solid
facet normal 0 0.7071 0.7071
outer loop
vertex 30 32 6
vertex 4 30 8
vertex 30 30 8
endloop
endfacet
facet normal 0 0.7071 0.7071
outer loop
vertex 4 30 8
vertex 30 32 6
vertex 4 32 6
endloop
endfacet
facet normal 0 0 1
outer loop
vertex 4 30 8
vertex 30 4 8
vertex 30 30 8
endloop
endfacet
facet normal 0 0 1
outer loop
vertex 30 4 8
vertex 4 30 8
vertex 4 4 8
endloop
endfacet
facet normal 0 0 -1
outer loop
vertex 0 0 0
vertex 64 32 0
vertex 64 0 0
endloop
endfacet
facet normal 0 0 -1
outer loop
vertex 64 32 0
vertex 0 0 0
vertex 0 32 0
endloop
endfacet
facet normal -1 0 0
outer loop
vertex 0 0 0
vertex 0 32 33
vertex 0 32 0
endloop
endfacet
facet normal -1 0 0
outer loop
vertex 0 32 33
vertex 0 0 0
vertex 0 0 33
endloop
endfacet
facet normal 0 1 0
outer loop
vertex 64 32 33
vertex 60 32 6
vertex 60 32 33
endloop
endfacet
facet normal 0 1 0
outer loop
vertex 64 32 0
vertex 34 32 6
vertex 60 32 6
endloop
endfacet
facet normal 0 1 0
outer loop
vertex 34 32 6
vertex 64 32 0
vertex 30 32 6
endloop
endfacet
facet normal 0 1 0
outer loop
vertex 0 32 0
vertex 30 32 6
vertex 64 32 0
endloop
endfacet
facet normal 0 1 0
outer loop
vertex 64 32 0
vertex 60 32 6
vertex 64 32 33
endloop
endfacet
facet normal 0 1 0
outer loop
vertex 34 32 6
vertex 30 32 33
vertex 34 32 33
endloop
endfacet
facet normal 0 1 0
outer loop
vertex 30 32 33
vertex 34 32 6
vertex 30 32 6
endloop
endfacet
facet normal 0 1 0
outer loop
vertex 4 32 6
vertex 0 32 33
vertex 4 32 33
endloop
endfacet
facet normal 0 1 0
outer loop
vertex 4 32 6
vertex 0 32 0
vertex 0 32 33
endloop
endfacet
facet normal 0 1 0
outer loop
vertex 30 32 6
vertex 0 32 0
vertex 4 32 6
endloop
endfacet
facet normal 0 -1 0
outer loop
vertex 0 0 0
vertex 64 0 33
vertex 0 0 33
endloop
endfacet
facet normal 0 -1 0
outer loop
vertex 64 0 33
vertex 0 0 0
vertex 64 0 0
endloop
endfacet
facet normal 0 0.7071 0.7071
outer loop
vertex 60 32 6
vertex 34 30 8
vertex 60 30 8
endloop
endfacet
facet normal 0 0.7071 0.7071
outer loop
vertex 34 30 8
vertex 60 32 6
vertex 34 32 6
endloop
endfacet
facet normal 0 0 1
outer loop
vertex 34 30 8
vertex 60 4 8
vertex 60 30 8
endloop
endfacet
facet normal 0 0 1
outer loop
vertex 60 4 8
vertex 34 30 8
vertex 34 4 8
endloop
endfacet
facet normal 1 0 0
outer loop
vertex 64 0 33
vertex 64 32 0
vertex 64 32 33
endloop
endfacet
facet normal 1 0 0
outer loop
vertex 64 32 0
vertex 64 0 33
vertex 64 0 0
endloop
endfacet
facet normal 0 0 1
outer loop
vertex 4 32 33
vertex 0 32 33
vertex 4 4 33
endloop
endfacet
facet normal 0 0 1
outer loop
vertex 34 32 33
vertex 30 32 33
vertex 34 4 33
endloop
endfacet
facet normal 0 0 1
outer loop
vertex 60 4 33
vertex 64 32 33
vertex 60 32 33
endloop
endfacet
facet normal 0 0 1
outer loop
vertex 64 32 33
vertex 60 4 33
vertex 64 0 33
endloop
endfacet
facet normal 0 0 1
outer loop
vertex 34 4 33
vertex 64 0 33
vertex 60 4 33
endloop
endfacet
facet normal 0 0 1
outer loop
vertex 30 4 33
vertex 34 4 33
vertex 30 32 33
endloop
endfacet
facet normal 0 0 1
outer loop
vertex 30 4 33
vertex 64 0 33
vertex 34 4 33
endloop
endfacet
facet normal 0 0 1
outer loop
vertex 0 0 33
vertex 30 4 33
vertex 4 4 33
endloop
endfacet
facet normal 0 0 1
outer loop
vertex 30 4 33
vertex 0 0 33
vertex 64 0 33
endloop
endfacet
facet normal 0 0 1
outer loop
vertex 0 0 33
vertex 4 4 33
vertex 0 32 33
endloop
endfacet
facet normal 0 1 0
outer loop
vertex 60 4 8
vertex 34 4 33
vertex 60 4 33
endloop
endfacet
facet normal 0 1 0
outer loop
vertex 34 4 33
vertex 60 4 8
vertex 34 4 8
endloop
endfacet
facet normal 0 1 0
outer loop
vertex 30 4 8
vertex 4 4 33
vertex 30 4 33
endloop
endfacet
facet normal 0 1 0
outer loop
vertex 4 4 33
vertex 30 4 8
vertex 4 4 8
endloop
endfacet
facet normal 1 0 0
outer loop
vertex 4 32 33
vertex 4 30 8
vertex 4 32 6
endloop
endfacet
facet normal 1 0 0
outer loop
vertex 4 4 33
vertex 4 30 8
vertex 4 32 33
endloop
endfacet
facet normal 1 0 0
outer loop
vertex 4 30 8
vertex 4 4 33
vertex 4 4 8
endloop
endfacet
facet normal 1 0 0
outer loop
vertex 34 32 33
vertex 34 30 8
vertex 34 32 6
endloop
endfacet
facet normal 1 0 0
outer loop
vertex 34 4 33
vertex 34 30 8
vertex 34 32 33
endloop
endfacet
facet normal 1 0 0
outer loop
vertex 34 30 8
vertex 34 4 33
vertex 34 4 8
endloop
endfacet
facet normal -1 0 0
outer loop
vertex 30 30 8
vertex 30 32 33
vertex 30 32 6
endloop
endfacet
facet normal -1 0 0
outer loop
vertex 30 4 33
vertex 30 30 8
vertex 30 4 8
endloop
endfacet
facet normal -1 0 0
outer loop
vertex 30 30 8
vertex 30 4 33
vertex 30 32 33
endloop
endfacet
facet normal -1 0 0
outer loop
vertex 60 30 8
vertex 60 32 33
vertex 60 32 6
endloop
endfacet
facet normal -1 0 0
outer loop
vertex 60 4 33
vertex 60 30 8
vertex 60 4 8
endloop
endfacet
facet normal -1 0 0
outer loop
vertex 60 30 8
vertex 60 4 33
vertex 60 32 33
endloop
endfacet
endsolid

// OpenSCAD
// file: WylochStyleDungeonLibrary.scad
size = 32;
baseheight = 6;
topperheight = 2;
topperrounded = true;
walllength = size;
wallheight = 25 + baseheight + topperheight;
wallwidth = 6;
wallwidththin = 4;

function hypotenuse_ra(side_a, side_b) =
    sqrt(pow(side_a, 2) + pow(side_b, 2));
    
module wsdl_Base(s,bh)
{
    cube([s,s,bh]);
}

module wsdl_Topper(s,bh,th,tr)
{
    if (tr) {
        translate([0,0,bh])
            intersection() {
                difference () {
                        cube([s,s,th]);
                        union () {
                        rotate(a=45, v=[1,0,0])
                            cube([s,th*2,th*2]);
                        translate([0,s,0])
                            rotate(a=45, v=[1,0,0])
                                cube([s,th*2,th*2]);
                        rotate(a=-45, v=[0,1,0])
                            cube([th*2,s,th*2]);
                        translate([s,0,0])
                            rotate(a=-45, v=[0,1,0])
                                cube([th*2,s,th*2]);
                        }
                }
                translate([s/2,s/2,0])
                    cylinder(
                        h=th, 
                        r1=hypotenuse_ra(s/2-1.2, s/2-1.2), 
                        r2=hypotenuse_ra(s/2-th-.8, s/2-th-.8), 
                        center=false, 
                        $fa=.1);
            }    
    }
    else {
        translate([0,0,bh])
            difference() {
                cube([s,s,th]);
                union () {
                rotate(a=45, v=[1,0,0])
                    cube([s,th*2,th*2]);
                translate([0,s,0])
                    rotate(a=45, v=[1,0,0])
                        cube([s,th*2,th*2]);
                rotate(a=-45, v=[0,1,0])
                    cube([th*2,s,th*2]);
                translate([s,0,0])
                    rotate(a=-45, v=[0,1,0])
                        cube([th*2,s,th*2]);
                }
            }    
    }
}

module wsdl_Base_1x1(s,bh,th,tr) 
{
    union () {
        wsdl_Base(s,bh);
        wsdl_Topper(s,bh,th,tr);
    }
}

module wsdl_Base_1x2(s,bh,th,tr)
{
    union () {
        wsdl_Base_1x1(s,bh,th,tr);
        translate([s,0,0])
            wsdl_Base_1x1(s,bh,th,tr);
    }
}
 
module wsdl_Base_2x2(s,bh,th,tr)
{
    union () {
        wsdl_Base_1x2(s,bh,th,tr);
        translate([0,s,0])
            wsdl_Base_1x2(s,bh,th,tr);
    }
}
 
module wsdl_Base_2x4(s,bh,th,tr)
{
    union () {
        wsdl_Base_2x2(s,bh,th,tr);
        translate([s*2,0,0])
            wsdl_Base_2x2(s,bh,th,tr);
    }
}
 
module wsdl_Base_4x4(s,bh,th,tr)
{
    union () {
        wsdl_Base_2x4(s,bh,th,tr);
        translate([0,s*2,0])
            wsdl_Base_2x4(s,bh,th,tr);
    }
}
 
module wsdl_Wall_1(w,l,h)
{
    cube([w,l,h]);   
}

module wsdl_Wall_2(w,l,h)
{
    union() {
        wsdl_Wall_1(w,l,h);
        translate([0,l,0])
            wsdl_Wall_1(w,l,h);
    }
}

module wsdl_Wall_1_Left(w,l,h) 
{
    wsdl_Wall_1(w,l,h);
}

module wsdl_Wall_1_Right(w,l,h) 
{
    translate([(size)-w,0,0])
        wsdl_Wall_1(w,l,h);
}

module wsdl_Wall_1_DoubleRight(w,l,h) 
{
    translate([(size*2)-w,0,0])
        wsdl_Wall_1(w,l,h);
}

module wsdl_Wall_1_Bottom(w,l,h) 
{
rotate(a=-90)
    translate([-w,0,0])
        wsdl_Wall_1(w,l,h);

}

module wsdl_Wall_1_Top(w,l,h) 
{
rotate(a=-90)
    translate([-l,0,0])
        wsdl_Wall_1(w,l,h);

}

module wsdl_Wall_1_Center(w,l,h) 
{
    translate([(size)-w/2,0,0])
        wsdl_Wall_1(w,l,h);
}


module wsdl_Wall_2_Left(w,l,h) 
{
    wsdl_Wall_2(w,l,h);
}

module wsdl_Wall_2_Right(w,l,h) 
{
    translate([(size*2)-w,0,0])
        wsdl_Wall_2(w,l,h);
}

module wsdl_Wall_2_Bottom(w,l,h) 
{
rotate(a=-90)
    translate([-w,0,0])
        wsdl_Wall_2(w,l,h);

}

module wsdl_Wall_2_Top(w,l,h) 
{
rotate(a=-90)
    translate([-l*2,0,0])
        wsdl_Wall_2(w,l,h);

}

module wsdl_Wall_2_Center(w,l,h) 
{
    translate([(size)-w/2,0,0])
        wsdl_Wall_2(w,l,h);
}
// main file
include <WylochStyleDungeonLibrary.scad>; 

wsdl_Base_1x2(size,baseheight,topperheight,topperrounded=false);
wsdl_Wall_1_Left(wallwidththin,walllength,wallheight);
wsdl_Wall_1_Center(wallwidththin,walllength,wallheight);
wsdl_Wall_2_Bottom(wallwidththin,walllength,wallheight);
wsdl_Wall_1_DoubleRight(wallwidththin,walllength,wallheight);
